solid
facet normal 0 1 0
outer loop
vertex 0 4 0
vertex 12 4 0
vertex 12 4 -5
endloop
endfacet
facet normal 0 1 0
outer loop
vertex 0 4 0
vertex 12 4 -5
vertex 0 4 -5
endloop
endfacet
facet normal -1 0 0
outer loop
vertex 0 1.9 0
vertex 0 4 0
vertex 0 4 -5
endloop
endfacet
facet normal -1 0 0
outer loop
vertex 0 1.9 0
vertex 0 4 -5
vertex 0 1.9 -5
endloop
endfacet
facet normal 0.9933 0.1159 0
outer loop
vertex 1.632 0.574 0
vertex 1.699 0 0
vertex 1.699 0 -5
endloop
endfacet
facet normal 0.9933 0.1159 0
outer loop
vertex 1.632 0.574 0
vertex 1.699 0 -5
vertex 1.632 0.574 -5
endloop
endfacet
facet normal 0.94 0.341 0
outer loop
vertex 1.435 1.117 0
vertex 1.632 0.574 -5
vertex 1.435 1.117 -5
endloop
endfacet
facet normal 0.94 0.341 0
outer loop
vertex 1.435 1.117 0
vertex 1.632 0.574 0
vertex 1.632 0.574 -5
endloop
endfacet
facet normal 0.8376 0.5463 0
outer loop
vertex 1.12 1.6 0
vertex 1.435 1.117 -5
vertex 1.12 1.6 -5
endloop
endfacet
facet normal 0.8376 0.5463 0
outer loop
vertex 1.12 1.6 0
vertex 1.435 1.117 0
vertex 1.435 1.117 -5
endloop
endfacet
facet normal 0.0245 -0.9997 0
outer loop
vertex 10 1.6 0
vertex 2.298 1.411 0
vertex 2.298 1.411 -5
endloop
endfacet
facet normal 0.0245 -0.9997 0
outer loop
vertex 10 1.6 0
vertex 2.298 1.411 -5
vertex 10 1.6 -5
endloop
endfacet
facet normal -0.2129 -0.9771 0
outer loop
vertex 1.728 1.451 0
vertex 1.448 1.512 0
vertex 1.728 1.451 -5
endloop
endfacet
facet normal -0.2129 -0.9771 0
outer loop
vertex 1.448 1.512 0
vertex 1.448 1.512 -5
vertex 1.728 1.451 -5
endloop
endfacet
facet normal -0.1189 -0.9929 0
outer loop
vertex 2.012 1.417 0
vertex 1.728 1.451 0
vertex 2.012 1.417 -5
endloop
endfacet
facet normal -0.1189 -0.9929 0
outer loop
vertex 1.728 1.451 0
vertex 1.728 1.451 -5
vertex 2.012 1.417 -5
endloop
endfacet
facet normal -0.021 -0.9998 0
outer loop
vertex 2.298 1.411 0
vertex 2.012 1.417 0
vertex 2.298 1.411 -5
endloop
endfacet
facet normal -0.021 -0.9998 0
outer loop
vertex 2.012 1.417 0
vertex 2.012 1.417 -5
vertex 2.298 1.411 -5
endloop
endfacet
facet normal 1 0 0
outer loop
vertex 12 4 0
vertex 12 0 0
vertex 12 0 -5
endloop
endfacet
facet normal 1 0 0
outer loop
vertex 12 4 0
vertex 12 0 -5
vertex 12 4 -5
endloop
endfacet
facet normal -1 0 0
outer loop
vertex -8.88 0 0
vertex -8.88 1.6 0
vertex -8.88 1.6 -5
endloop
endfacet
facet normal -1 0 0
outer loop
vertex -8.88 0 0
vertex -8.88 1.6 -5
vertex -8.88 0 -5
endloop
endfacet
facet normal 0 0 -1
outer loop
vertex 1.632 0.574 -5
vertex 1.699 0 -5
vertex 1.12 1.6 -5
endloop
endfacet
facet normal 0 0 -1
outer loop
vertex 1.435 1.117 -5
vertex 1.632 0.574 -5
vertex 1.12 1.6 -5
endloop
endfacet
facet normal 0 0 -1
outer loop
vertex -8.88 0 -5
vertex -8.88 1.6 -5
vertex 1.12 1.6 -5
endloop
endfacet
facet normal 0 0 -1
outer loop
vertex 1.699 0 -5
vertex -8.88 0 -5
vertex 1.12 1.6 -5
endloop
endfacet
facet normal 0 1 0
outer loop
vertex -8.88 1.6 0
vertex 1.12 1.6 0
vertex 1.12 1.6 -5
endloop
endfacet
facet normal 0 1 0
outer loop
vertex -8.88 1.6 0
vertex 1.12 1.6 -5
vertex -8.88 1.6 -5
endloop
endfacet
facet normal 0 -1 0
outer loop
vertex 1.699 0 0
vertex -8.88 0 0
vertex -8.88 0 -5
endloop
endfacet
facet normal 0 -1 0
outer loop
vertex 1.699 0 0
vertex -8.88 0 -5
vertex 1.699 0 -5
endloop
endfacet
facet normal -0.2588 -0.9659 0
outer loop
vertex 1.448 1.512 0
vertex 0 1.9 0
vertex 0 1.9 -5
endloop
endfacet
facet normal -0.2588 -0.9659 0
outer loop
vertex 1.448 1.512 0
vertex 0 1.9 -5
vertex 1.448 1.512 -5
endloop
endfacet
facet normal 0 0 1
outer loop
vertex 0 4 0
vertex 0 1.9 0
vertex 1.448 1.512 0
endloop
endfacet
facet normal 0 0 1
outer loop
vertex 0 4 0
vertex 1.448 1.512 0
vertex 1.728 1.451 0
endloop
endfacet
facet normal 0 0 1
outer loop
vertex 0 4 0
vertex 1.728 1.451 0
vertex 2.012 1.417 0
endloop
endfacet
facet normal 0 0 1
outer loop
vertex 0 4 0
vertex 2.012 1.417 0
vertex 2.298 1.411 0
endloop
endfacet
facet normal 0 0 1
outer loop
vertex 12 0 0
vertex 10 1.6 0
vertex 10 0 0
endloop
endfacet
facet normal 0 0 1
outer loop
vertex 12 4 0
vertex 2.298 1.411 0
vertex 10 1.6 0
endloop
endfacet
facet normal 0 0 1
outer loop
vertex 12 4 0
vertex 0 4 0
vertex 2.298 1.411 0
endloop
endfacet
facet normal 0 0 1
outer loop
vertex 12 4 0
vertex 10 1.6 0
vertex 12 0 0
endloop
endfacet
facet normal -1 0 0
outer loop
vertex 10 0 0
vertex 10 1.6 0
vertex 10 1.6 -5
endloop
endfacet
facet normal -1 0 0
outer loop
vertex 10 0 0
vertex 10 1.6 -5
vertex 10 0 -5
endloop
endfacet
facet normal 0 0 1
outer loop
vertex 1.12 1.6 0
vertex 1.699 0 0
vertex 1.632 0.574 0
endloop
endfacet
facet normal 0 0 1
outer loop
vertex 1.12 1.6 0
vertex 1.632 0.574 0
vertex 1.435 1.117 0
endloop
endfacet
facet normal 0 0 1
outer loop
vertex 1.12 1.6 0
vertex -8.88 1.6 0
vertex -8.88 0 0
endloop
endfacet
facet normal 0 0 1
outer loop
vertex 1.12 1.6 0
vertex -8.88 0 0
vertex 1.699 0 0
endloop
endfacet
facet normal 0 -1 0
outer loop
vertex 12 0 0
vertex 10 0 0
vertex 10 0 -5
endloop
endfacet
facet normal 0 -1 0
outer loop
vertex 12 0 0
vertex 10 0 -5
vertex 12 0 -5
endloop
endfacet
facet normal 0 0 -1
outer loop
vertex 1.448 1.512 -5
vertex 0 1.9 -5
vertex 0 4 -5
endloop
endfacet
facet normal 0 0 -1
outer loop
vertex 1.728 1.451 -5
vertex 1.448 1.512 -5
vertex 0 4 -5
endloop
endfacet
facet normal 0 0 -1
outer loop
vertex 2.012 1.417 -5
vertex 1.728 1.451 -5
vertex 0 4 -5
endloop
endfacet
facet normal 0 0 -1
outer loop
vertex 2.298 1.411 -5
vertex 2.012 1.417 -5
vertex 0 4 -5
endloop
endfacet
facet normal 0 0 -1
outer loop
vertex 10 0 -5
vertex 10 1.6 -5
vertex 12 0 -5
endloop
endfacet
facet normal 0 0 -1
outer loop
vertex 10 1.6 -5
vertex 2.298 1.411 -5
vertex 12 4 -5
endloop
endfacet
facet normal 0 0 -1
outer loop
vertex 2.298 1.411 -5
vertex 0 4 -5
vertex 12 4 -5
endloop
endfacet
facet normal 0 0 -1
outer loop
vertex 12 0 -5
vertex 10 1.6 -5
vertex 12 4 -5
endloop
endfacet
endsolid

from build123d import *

# Parameters (mm, degrees)
F1_DEPTH = 5
F2_R     = 3
F4_DEPTH = 5


with BuildPart() as f1:
    # F0 (on Top) → F1 (new body)
    with BuildSketch(Plane.XY):
        Polygon((12, 4), (0, 4), (0, 1.9), (1.866025, 1.4), (10, 1.6), (10, 0), (12, 0), align=None)
    extrude(amount=-F1_DEPTH)

    # F2
    f2_edges = [f1.edges().sort_by_distance(p)[0] for p in [
        (1.866025, 1.4, -2.5),
    ]]
    fillet(f2_edges, radius=F2_R)


with BuildPart() as f4:
    # F3 (on Top) → F4 (new body)
    with BuildSketch(Plane.XY):
        with BuildLine():
            ThreePointArc((1.698678, 0), (1.549459, 0.850781), (1.119615, 1.6))
            Line((1.119615, 1.6), (-8.880385, 1.6))
            Line((-8.880385, 1.6), (-8.880385, 0))
            Line((-8.880385, 0), (1.698678, 0))
        make_face()
    extrude(amount=-F4_DEPTH)


solid = Compound([f1.part, f4.part])
